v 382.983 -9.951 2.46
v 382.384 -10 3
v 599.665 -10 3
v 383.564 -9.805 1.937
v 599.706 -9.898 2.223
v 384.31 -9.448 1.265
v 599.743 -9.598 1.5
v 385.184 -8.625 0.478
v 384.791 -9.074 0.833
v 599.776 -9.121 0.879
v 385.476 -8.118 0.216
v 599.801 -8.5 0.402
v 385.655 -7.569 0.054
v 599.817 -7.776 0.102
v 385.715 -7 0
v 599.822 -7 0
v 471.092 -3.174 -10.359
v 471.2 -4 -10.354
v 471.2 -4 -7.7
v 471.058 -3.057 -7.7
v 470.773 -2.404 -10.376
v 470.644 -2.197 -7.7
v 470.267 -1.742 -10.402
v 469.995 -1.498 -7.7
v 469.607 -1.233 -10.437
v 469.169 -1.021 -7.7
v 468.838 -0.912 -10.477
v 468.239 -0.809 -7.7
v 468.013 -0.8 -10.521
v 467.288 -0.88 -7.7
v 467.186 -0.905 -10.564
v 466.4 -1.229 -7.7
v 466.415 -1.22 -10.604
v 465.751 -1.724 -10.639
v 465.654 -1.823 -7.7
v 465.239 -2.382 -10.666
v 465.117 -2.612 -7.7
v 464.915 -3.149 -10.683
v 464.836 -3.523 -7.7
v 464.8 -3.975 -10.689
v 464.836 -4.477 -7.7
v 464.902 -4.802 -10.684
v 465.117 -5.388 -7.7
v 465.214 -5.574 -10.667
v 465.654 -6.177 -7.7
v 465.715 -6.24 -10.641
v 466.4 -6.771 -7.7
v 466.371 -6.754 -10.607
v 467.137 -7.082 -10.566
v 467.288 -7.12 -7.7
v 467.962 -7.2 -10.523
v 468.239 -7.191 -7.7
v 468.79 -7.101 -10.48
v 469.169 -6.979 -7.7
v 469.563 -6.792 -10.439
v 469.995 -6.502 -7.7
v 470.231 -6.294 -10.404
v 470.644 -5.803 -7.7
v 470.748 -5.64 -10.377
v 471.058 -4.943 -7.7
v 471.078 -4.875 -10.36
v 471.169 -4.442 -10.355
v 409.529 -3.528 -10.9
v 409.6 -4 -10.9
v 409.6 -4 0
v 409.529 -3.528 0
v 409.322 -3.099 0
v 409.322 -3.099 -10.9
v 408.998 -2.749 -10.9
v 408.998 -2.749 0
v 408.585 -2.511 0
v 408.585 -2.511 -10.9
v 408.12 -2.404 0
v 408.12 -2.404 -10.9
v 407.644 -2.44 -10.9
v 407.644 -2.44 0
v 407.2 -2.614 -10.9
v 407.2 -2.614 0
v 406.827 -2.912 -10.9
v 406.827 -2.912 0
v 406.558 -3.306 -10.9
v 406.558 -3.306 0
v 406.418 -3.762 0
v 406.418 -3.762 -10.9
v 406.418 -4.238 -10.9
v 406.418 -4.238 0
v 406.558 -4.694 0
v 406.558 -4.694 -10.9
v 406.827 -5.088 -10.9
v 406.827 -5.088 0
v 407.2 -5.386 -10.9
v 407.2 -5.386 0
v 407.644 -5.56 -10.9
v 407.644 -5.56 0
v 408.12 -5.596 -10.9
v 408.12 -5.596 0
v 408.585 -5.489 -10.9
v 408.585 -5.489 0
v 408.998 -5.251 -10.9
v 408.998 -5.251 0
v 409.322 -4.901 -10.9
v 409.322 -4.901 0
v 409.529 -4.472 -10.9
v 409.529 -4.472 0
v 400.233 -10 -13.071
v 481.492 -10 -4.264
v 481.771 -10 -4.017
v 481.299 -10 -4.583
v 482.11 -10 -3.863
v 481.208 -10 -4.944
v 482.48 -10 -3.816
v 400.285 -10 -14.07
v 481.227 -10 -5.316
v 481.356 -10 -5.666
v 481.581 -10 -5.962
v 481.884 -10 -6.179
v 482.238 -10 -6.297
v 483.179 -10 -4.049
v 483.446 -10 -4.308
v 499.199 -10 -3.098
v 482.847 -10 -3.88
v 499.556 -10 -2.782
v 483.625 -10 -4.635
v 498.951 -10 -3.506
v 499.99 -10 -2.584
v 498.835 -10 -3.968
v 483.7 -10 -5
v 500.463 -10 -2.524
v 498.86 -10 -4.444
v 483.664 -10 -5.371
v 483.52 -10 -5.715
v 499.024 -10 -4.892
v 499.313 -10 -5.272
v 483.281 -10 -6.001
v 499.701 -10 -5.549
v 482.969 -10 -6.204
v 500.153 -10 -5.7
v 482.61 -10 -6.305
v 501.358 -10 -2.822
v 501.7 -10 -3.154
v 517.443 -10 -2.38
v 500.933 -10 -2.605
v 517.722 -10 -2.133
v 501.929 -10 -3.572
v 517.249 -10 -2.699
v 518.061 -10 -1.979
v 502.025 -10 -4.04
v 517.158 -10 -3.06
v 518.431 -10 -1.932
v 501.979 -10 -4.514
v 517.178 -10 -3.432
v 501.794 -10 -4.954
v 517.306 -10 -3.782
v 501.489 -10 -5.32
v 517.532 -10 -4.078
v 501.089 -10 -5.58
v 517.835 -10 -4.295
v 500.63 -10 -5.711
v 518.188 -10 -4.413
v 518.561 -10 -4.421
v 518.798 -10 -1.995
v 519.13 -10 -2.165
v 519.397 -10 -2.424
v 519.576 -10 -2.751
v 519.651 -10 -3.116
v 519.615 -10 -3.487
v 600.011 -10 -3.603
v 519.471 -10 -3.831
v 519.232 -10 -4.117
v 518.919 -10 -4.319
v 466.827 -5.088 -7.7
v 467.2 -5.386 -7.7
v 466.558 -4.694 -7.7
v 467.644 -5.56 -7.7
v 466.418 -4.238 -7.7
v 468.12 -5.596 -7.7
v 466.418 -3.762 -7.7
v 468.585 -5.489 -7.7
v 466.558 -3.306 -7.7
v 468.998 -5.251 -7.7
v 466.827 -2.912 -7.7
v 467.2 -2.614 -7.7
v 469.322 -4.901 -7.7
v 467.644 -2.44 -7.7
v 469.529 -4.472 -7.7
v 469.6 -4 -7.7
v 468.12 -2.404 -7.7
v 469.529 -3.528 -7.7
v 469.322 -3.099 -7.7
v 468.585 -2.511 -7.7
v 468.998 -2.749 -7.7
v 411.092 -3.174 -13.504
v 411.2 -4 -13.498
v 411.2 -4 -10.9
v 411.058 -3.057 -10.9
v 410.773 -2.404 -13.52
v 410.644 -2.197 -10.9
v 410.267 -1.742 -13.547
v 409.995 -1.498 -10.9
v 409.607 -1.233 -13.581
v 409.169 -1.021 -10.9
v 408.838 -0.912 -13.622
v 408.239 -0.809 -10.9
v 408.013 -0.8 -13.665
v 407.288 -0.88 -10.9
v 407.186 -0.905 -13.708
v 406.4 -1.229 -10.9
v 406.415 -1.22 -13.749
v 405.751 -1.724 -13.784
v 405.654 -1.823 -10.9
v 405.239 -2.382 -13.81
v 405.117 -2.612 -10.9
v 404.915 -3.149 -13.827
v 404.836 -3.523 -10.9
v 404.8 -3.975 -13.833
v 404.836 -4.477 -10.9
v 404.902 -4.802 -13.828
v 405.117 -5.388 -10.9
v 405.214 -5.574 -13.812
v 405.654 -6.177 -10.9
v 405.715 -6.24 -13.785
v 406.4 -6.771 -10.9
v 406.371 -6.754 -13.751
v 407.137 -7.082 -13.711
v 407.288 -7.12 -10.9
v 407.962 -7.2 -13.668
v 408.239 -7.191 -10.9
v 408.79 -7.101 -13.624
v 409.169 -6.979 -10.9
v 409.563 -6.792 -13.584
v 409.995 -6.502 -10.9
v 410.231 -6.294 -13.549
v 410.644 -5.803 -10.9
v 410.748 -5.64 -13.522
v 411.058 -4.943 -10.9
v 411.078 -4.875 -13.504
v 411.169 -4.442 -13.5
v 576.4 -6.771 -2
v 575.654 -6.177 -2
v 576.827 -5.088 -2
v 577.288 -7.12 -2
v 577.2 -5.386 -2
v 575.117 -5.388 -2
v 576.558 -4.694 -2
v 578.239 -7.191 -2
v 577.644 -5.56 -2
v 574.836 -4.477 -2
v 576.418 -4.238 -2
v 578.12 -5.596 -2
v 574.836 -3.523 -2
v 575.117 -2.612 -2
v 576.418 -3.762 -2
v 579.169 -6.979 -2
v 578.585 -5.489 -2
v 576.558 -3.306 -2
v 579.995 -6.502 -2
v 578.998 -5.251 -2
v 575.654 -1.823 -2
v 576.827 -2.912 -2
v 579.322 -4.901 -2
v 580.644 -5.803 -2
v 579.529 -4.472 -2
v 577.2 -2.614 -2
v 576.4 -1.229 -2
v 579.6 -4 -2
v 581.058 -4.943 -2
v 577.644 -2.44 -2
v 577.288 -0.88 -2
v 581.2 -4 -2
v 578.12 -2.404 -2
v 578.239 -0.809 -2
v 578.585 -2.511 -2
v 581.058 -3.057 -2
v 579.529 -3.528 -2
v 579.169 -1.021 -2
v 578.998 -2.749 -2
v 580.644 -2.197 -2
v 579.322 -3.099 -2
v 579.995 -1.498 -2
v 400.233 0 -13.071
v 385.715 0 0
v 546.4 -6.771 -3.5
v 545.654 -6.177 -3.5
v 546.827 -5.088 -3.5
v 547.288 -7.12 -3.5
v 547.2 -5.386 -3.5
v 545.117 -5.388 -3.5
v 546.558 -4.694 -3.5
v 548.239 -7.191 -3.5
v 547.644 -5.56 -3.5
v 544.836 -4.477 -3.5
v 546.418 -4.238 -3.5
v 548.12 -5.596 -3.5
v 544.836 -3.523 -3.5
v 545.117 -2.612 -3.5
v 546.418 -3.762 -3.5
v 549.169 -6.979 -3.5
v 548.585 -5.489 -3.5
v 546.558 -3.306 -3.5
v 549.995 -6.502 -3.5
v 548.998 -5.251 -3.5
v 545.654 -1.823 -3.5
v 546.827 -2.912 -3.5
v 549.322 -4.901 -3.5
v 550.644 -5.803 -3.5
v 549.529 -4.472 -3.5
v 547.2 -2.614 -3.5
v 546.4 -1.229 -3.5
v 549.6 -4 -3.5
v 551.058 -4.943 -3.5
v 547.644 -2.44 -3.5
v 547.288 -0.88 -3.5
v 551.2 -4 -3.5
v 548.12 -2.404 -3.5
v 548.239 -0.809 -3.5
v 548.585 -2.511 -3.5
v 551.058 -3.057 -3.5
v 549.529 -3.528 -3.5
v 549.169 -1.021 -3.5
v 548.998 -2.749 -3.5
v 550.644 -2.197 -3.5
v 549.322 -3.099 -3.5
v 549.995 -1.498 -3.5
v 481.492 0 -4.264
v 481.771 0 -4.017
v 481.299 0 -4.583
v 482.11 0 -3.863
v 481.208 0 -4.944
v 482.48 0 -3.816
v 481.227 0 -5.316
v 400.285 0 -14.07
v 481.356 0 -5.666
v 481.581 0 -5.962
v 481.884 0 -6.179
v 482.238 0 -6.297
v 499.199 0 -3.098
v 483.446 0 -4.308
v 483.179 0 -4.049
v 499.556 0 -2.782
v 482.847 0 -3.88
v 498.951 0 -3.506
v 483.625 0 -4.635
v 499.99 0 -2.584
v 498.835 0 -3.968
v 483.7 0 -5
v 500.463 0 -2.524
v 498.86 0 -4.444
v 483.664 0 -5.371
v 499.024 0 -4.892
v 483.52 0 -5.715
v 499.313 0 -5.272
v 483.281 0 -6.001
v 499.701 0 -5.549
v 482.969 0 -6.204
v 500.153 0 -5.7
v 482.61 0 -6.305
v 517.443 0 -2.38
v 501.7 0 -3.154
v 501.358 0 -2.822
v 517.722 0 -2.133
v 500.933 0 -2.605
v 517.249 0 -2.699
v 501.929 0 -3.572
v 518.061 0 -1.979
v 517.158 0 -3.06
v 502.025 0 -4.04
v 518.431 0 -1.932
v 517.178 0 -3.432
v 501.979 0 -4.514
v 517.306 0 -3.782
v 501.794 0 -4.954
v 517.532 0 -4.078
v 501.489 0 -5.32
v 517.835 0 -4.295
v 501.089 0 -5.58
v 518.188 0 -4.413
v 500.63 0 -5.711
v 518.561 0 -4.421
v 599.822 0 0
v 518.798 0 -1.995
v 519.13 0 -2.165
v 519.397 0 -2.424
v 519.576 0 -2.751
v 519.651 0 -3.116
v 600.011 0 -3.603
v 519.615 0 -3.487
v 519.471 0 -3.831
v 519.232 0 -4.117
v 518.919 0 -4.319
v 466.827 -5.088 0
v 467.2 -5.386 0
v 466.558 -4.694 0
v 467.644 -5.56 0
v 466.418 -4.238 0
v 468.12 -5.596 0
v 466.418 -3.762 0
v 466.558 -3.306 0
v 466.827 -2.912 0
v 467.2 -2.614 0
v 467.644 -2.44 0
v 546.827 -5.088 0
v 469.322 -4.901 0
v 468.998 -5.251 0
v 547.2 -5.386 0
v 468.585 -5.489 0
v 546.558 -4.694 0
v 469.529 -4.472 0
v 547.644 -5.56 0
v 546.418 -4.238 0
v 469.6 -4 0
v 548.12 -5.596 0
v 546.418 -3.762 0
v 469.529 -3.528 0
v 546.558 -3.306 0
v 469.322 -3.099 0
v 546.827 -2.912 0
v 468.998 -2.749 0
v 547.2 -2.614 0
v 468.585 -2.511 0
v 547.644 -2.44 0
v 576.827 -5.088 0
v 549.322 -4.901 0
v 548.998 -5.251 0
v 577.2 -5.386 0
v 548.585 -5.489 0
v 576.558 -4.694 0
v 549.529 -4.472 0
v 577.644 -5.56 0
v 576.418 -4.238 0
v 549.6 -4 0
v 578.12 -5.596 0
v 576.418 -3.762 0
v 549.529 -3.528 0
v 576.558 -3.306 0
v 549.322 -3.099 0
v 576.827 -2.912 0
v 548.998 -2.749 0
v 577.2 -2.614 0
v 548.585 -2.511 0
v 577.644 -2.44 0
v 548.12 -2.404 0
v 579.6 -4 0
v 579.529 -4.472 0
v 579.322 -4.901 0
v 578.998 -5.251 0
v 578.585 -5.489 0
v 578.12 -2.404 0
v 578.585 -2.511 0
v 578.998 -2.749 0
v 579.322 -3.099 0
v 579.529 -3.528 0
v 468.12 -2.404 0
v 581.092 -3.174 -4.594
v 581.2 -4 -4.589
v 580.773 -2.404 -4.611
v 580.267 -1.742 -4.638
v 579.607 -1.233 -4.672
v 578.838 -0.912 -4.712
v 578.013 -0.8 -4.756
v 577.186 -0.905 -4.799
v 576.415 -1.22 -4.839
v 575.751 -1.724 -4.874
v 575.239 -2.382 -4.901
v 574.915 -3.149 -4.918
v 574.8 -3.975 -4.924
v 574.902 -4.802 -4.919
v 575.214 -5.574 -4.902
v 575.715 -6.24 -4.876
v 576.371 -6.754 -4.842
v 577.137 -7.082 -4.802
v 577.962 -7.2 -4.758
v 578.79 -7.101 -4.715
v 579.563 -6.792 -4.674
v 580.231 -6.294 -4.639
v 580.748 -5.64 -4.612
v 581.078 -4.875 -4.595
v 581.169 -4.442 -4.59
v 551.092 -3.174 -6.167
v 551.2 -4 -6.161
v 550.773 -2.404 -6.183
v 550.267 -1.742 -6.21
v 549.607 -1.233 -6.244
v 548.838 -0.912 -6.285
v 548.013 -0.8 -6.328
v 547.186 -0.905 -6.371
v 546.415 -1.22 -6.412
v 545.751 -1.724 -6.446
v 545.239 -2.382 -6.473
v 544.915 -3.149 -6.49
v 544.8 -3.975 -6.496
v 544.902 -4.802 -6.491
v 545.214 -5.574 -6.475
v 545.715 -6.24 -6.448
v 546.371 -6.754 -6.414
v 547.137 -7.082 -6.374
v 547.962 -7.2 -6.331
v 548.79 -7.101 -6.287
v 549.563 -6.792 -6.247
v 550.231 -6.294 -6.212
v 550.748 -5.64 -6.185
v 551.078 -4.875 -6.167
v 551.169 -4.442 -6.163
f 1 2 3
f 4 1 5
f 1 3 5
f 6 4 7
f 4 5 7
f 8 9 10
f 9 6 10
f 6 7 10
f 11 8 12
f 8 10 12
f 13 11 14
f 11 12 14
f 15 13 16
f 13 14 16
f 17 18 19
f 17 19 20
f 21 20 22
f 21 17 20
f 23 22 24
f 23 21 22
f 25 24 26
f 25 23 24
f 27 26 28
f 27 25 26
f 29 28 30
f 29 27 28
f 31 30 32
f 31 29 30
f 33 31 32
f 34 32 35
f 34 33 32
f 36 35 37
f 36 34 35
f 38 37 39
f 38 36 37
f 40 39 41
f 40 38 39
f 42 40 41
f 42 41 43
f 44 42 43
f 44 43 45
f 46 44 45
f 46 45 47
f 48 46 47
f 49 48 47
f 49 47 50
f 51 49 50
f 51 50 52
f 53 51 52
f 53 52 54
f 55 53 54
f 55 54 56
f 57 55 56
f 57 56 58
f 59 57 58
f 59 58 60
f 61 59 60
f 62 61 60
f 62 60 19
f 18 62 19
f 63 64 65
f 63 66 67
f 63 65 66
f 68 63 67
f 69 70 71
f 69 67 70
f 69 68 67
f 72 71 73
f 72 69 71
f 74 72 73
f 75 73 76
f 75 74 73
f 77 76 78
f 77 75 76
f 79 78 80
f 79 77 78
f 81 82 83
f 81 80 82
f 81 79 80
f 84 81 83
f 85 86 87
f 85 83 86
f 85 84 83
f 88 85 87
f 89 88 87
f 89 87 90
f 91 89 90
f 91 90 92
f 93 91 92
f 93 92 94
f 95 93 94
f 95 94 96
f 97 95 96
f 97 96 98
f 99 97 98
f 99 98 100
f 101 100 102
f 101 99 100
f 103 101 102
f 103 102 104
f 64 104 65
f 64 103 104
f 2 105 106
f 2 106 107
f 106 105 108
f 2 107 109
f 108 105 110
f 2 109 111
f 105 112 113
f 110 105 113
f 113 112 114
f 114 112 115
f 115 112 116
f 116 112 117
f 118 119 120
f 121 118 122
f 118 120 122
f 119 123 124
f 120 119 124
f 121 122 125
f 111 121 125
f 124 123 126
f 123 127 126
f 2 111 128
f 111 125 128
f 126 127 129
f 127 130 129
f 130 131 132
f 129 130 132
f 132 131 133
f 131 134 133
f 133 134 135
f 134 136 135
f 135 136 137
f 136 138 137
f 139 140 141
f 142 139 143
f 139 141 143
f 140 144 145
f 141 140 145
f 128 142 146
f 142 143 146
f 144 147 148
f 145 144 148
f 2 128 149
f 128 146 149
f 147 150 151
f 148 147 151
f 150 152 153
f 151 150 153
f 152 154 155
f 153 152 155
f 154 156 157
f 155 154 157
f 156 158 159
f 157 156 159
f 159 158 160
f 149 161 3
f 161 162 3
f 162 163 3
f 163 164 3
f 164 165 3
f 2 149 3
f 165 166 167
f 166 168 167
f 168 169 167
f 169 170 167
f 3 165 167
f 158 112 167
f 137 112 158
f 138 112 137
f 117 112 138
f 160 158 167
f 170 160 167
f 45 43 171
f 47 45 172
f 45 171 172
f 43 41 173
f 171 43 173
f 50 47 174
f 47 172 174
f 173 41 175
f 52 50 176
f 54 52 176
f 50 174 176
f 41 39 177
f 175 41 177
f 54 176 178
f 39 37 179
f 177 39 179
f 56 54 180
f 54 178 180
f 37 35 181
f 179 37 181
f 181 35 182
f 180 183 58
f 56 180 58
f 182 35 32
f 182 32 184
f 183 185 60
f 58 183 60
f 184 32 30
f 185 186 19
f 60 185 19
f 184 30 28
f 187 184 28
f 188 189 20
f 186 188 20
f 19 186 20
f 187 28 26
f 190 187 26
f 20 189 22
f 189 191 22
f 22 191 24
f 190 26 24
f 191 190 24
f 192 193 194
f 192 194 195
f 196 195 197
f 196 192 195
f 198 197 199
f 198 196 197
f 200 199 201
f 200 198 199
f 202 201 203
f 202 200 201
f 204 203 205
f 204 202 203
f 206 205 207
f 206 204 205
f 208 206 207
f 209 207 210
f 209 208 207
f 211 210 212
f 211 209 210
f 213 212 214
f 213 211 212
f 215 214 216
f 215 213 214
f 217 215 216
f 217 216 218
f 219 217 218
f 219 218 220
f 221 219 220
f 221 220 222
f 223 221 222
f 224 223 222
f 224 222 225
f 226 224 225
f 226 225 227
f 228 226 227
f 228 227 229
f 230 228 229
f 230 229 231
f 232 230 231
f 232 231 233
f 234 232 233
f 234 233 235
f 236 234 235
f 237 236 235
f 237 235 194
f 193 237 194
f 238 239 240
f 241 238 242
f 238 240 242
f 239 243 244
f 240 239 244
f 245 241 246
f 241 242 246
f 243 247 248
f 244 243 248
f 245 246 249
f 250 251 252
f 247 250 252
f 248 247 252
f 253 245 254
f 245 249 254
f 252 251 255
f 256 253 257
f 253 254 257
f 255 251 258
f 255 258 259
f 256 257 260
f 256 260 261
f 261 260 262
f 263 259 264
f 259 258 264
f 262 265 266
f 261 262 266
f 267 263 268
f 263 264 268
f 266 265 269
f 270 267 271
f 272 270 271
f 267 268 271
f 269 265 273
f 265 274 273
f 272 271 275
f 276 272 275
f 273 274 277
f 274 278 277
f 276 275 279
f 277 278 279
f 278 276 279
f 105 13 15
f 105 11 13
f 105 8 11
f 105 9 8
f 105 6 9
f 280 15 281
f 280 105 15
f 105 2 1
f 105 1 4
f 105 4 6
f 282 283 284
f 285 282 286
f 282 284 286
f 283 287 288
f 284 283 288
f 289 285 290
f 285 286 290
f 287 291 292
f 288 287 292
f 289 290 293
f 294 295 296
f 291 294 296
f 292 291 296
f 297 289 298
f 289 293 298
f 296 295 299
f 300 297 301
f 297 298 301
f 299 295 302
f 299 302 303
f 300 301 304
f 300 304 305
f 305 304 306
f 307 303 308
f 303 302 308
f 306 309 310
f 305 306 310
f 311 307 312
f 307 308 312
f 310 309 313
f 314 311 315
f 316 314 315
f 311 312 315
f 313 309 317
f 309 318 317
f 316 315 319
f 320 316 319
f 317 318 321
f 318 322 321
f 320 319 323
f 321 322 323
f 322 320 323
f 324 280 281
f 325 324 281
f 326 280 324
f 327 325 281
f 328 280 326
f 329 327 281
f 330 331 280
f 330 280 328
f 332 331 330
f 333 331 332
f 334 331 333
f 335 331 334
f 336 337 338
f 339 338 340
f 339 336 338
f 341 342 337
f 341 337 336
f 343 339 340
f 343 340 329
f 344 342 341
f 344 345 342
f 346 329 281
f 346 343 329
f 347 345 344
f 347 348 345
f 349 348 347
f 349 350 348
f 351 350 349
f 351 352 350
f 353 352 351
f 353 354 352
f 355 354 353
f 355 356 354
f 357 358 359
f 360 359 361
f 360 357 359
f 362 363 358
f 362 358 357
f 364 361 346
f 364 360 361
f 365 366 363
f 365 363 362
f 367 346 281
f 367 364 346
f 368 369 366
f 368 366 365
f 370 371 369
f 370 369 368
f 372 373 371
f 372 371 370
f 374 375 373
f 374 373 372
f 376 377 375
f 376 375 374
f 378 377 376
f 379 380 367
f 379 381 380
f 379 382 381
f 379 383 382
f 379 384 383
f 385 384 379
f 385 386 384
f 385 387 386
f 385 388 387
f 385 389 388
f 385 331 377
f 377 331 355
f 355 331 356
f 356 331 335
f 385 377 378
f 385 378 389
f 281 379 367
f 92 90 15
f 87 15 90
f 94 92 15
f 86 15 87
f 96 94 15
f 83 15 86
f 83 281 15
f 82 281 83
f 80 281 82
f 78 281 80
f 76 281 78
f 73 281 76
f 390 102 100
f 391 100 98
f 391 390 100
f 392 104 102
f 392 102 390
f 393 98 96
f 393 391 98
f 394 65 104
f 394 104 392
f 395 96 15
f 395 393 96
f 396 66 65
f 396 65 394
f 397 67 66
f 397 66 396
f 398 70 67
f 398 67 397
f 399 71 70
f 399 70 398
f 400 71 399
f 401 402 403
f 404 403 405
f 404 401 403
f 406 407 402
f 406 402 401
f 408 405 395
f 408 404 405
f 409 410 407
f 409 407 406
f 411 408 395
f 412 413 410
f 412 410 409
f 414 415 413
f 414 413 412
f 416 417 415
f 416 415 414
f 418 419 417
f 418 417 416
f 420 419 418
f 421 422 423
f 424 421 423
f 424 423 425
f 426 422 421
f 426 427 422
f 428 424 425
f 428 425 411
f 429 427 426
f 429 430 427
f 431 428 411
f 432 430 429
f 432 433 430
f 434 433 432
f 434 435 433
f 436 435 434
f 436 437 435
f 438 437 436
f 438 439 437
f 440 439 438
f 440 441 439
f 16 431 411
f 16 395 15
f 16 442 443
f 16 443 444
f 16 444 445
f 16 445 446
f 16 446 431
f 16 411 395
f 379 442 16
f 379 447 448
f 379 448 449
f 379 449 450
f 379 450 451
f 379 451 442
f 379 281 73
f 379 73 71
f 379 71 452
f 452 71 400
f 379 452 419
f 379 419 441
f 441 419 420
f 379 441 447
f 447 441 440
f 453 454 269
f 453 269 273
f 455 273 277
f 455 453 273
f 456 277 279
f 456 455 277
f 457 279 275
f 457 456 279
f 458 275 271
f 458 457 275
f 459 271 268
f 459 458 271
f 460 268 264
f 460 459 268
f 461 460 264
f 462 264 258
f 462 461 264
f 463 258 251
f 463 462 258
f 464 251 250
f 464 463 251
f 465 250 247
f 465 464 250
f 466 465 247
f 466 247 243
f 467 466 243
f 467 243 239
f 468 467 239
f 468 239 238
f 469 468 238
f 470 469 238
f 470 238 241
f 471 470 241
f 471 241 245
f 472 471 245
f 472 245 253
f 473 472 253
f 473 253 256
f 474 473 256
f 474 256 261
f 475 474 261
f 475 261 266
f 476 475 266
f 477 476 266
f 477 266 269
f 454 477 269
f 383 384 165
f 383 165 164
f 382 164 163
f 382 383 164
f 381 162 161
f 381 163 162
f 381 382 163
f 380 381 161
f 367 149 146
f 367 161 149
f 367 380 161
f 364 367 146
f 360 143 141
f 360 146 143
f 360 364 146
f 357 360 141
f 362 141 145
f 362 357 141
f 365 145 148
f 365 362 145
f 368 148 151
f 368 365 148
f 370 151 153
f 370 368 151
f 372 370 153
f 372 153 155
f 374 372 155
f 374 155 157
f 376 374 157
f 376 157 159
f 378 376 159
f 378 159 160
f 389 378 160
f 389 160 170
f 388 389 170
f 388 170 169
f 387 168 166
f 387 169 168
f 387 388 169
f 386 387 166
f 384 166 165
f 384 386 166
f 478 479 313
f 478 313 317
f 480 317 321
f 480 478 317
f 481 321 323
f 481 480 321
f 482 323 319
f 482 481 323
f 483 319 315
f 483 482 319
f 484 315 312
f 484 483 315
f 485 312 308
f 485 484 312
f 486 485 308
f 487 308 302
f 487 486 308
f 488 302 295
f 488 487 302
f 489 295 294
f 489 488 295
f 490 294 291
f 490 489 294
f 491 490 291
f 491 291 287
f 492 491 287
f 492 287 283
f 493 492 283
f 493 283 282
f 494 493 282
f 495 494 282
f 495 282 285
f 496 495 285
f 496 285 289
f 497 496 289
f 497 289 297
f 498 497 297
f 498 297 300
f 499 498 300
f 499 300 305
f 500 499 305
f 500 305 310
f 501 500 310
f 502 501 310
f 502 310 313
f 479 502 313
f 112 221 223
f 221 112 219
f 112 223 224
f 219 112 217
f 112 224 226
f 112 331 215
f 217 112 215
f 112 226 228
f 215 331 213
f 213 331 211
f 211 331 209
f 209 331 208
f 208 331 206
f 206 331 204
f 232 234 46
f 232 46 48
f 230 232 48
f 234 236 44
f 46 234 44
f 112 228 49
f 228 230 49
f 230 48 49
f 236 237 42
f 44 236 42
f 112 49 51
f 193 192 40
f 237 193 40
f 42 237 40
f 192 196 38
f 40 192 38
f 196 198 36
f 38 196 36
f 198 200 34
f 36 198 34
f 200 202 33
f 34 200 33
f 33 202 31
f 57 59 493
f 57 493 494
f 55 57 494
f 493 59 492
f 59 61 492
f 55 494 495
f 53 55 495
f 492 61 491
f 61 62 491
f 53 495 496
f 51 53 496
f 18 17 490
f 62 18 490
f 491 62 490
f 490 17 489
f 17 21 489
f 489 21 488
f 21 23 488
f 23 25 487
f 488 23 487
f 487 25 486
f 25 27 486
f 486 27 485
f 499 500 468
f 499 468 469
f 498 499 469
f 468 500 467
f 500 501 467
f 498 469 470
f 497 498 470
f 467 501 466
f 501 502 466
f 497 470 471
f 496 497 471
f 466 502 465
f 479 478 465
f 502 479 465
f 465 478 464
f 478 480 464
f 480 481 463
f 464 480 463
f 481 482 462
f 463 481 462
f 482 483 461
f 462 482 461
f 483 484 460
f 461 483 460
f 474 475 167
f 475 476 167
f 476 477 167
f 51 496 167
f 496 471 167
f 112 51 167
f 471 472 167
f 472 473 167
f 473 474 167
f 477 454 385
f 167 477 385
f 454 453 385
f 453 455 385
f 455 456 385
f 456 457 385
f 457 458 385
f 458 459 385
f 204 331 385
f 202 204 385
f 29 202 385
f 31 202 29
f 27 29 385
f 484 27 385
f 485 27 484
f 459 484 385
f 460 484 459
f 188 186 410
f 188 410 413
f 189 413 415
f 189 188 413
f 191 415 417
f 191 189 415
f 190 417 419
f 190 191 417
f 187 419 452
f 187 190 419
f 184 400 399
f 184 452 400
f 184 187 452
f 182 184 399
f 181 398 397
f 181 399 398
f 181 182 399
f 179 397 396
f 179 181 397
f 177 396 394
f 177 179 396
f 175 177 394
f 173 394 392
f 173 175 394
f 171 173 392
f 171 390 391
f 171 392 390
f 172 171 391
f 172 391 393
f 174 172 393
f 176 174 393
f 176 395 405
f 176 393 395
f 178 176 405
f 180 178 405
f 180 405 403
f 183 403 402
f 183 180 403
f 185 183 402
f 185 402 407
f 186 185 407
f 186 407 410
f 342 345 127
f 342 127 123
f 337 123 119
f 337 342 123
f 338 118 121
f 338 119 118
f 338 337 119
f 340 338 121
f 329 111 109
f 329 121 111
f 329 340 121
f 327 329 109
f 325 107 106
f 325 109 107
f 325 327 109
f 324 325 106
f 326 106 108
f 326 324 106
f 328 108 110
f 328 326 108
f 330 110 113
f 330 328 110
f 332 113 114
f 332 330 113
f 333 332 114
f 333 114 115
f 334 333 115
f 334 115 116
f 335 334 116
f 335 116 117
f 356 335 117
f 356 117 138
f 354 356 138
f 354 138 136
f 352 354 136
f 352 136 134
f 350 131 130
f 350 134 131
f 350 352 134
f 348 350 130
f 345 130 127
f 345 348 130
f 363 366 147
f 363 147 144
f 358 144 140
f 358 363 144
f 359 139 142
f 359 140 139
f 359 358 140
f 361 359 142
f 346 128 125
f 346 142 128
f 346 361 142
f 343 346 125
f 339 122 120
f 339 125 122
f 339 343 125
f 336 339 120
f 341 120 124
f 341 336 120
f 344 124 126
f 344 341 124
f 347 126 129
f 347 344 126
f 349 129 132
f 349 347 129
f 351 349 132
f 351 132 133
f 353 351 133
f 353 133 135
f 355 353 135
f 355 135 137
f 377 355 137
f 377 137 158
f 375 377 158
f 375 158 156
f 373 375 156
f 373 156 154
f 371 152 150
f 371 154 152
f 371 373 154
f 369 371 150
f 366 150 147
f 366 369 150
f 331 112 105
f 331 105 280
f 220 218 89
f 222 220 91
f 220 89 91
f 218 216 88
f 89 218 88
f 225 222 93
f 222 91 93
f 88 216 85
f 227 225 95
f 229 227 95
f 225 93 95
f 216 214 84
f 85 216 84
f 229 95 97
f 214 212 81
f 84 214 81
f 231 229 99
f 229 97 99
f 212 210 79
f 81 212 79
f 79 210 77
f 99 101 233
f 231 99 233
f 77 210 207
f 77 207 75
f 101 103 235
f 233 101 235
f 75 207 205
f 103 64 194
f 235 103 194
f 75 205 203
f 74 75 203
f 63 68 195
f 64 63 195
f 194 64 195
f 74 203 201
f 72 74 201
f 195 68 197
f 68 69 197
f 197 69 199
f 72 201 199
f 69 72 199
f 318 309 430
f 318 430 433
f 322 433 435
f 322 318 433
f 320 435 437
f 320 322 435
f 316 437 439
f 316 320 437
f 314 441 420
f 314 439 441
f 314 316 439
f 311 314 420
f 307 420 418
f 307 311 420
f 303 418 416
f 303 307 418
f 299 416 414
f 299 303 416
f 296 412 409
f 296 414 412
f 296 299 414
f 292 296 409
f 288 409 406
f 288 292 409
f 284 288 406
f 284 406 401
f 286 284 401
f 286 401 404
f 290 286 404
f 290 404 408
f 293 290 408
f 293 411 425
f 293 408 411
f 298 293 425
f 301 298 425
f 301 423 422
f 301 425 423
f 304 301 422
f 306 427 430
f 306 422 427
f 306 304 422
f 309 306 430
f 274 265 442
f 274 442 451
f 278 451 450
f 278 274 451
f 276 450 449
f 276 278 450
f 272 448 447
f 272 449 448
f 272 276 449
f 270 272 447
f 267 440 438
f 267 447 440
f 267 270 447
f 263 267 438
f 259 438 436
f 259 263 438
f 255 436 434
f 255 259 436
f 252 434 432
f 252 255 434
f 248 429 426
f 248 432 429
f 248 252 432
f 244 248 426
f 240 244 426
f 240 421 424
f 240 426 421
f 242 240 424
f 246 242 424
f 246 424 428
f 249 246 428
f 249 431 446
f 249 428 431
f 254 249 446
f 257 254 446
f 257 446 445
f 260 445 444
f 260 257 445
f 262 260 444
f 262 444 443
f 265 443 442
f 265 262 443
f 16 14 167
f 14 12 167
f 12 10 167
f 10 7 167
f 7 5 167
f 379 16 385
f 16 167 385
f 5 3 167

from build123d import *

# Parameters (mm, degrees)
CYLINDER033_R             = 1.6
CYLINDER033_DEPTH         = 100
CYLINDER034_R             = 1.25
CYLINDER034_DEPTH         = 100
CYLINDER035_R             = 1.25
CYLINDER035_DEPTH         = 100
FUSION027_PLACEMENT_ANGLE = 3.00002
CYLINDER012_R             = 3.2
CYLINDER012_DEPTH         = 3
CYLINDER013_R             = 1.6
CYLINDER013_DEPTH         = 30
CYLINDER014_R             = 3.2
CYLINDER014_DEPTH         = 3
CYLINDER015_R             = 1.6
CYLINDER015_DEPTH         = 30
CYLINDER016_R             = 3.2
CYLINDER016_DEPTH         = 3
CYLINDER017_R             = 1.6
CYLINDER017_DEPTH         = 30
CYLINDER011_R             = 3.2
CYLINDER011_DEPTH         = 3
CYLINDER010_R             = 1.6
CYLINDER010_DEPTH         = 30
BOX_W                     = 600
BOX_H                     = 10
BOX_DEPTH                 = 20
BOX_PLACEMENT_ANGLE       = 3
BOX001_W                  = 600
BOX001_H                  = 10
BOX001_DEPTH              = 20
BOX001_PLACEMENT_ANGLE    = 3
FILLET_R                  = 3
BOX003_W                  = 14
BOX003_H                  = 10
BOX003_DEPTH              = 27
BOX003_PLACEMENT_ANGLE    = 45
BOX002_W                  = 200
BOX002_H                  = 10
BOX002_DEPTH              = 17
CUT_PLACEMENT_ANGLE       = 2.999995


with BuildPart() as cylinder033:
    # Cylinder033 → Cylinder033 (new body)
    with BuildSketch(Plane(origin=(418, 0, 0), x_dir=(1, 0, 0), z_dir=(0, -1, 0))):
        Circle(CYLINDER033_R)
    extrude(amount=CYLINDER033_DEPTH)


with BuildPart() as cylinder034:
    # Cylinder034 → Cylinder034 (new body)
    with BuildSketch(Plane(origin=(436, 0, 0), x_dir=(1, 0, 0), z_dir=(0, -1, 0))):
        Circle(CYLINDER034_R)
    extrude(amount=CYLINDER034_DEPTH)


with BuildPart() as fusion027:
    # Cylinder035 → Cylinder035 (new body)
    with BuildSketch(Plane(origin=(400, 0, 0), x_dir=(1, 0, 0), z_dir=(0, -1, 0))):
        Circle(CYLINDER035_R)
    extrude(amount=CYLINDER035_DEPTH)

    # Fusion027: union Cylinder033, Cylinder034
    add(cylinder033.part)
    add(cylinder034.part)


with BuildPart() as fusion027_1:
    # Fusion027 placement: moved
    add(fusion027.part.moved(Location((83, 77, -26))).rotate(Axis((83, 77, -26), (0, -1, 0)), FUSION027_PLACEMENT_ANGLE))


with BuildPart() as cylinder012:
    # Cylinder012 → Cylinder012 (new body)
    with BuildSketch(Plane(origin=(578, 6, -35), x_dir=(1, 0, 0), z_dir=(0, 0, 1))):
        Circle(CYLINDER012_R)
    extrude(amount=CYLINDER012_DEPTH)


with BuildPart() as fusion013:
    # Cylinder013 → Cylinder013 (new body)
    with BuildSketch(Plane(origin=(578, 6, -35), x_dir=(1, 0, 0), z_dir=(0, 0, 1))):
        Circle(CYLINDER013_R)
    extrude(amount=CYLINDER013_DEPTH)

    # Fusion013: union Cylinder012
    add(cylinder012.part)


with BuildPart() as fusion013_1:
    # Fusion013 placement: moved
    add(fusion013.part.moved(Location((-170, 0, 21.1))))


with BuildPart() as cylinder014:
    # Cylinder014 → Cylinder014 (new body)
    with BuildSketch(Plane(origin=(578, 6, -35), x_dir=(1, 0, 0), z_dir=(0, 0, 1))):
        Circle(CYLINDER014_R)
    extrude(amount=CYLINDER014_DEPTH)


with BuildPart() as fusion014:
    # Cylinder015 → Cylinder015 (new body)
    with BuildSketch(Plane(origin=(578, 6, -35), x_dir=(1, 0, 0), z_dir=(0, 0, 1))):
        Circle(CYLINDER015_R)
    extrude(amount=CYLINDER015_DEPTH)

    # Fusion014: union Cylinder014
    add(cylinder014.part)


with BuildPart() as fusion014_1:
    # Fusion014 placement: moved
    add(fusion014.part.moved(Location((-110, 0, 24.3))))


with BuildPart() as cylinder016:
    # Cylinder016 → Cylinder016 (new body)
    with BuildSketch(Plane(origin=(578, 6, -35), x_dir=(1, 0, 0), z_dir=(0, 0, 1))):
        Circle(CYLINDER016_R)
    extrude(amount=CYLINDER016_DEPTH)


with BuildPart() as fusion015:
    # Cylinder017 → Cylinder017 (new body)
    with BuildSketch(Plane(origin=(578, 6, -35), x_dir=(1, 0, 0), z_dir=(0, 0, 1))):
        Circle(CYLINDER017_R)
    extrude(amount=CYLINDER017_DEPTH)

    # Fusion015: union Cylinder016
    add(cylinder016.part)


with BuildPart() as fusion015_1:
    # Fusion015 placement: moved
    add(fusion015.part.moved(Location((-30, 0, 28.5))))


with BuildPart() as cylinder011:
    # Cylinder011 → Cylinder011 (new body)
    with BuildSketch(Plane(origin=(578, 6, -35), x_dir=(1, 0, 0), z_dir=(0, 0, 1))):
        Circle(CYLINDER011_R)
    extrude(amount=CYLINDER011_DEPTH)


with BuildPart() as fusion035:
    # Cylinder010 → Cylinder010 (new body)
    with BuildSketch(Plane(origin=(578, 6, -35), x_dir=(1, 0, 0), z_dir=(0, 0, 1))):
        Circle(CYLINDER010_R)
    extrude(amount=CYLINDER010_DEPTH)

    # Fusion012: union Cylinder011
    add(cylinder011.part)


with BuildPart() as fusion035_1:
    # Fusion012 placement: moved
    add(fusion035.part.moved(Location((0, 0, 30))))

    # Fusion035: union Fusion013, Fusion014, Fusion015
    add(fusion013_1.part)
    add(fusion014_1.part)
    add(fusion015_1.part)


with BuildPart() as box:
    # Box → Box (new body)
    with BuildSketch(Plane.XY):
        with Locations((300, 5)):
            Rectangle(BOX_W, BOX_H)
    extrude(amount=BOX_DEPTH)


with BuildPart() as box_1:
    # Box placement: moved
    add(box.part.rotate(Axis((0, 0, 0), (0, 1, 0)), BOX_PLACEMENT_ANGLE))


with BuildPart() as fillet_body:
    # Box001 → Box001 (new body)
    with BuildSketch(Plane.XY):
        with Locations((300, 5)):
            Rectangle(BOX001_W, BOX001_H)
    extrude(amount=BOX001_DEPTH)


with BuildPart() as fillet_body_1:
    # Box001 placement: moved
    add(fillet_body.part.moved(Location((0, 52, 0))).rotate(Axis((0, 52, 0), (0, 1, 0)), BOX001_PLACEMENT_ANGLE))

    # Fusion: union Box
    add(box_1.part)

    # Fillet
    fillet_edges = [fillet_body_1.edges().sort_by_distance(p)[0] for p in [
        (300.63558, 62, 4.271804),
        (299.58886, 62, -15.700787),
        (299.58886, 0, -15.700787),
        (300.63558, 0, 4.271804),
    ]]
    fillet(fillet_edges, radius=FILLET_R)


with BuildPart() as box003:
    # Box003 → Box003 (new body)
    with BuildSketch(Plane.XY):
        with Locations((7, 5)):
            Rectangle(BOX003_W, BOX003_H)
    extrude(amount=BOX003_DEPTH)


with BuildPart() as box003_1:
    # Box003 placement: moved
    add(box003.part.moved(Location((400, 0, -35))).rotate(Axis((400, 0, -35), (0, -1, 0)), BOX003_PLACEMENT_ANGLE))


with BuildPart() as left_wheels_frame:
    # Box002 → Box002 (new body)
    with BuildSketch(Plane(origin=(399, 0, -35), x_dir=(1, 0, 0), z_dir=(0, 0, 1))):
        with Locations((100, 5)):
            Rectangle(BOX002_W, BOX002_H)
    extrude(amount=BOX002_DEPTH)

    # Fusion001: union Box003
    add(box003_1.part)

    # Cut: cut Fillet body
    add(fillet_body_1.part, mode=Mode.SUBTRACT)


with BuildPart() as left_wheels_frame_1:
    # Cut placement: moved
    add(left_wheels_frame.part.rotate(Axis((0, 0, 0), (0, -1, 0)), CUT_PLACEMENT_ANGLE))

    # Cut021: cut Fusion035
    add(fusion035_1.part, mode=Mode.SUBTRACT)

    # Cut022: cut Fusion027
    add(fusion027_1.part, mode=Mode.SUBTRACT)


with BuildPart() as left_wheels_frame_2:
    # Cut022 placement: moved
    add(left_wheels_frame_1.part.moved(Location((0, -10, 0))))


solid = left_wheels_frame_2.part
